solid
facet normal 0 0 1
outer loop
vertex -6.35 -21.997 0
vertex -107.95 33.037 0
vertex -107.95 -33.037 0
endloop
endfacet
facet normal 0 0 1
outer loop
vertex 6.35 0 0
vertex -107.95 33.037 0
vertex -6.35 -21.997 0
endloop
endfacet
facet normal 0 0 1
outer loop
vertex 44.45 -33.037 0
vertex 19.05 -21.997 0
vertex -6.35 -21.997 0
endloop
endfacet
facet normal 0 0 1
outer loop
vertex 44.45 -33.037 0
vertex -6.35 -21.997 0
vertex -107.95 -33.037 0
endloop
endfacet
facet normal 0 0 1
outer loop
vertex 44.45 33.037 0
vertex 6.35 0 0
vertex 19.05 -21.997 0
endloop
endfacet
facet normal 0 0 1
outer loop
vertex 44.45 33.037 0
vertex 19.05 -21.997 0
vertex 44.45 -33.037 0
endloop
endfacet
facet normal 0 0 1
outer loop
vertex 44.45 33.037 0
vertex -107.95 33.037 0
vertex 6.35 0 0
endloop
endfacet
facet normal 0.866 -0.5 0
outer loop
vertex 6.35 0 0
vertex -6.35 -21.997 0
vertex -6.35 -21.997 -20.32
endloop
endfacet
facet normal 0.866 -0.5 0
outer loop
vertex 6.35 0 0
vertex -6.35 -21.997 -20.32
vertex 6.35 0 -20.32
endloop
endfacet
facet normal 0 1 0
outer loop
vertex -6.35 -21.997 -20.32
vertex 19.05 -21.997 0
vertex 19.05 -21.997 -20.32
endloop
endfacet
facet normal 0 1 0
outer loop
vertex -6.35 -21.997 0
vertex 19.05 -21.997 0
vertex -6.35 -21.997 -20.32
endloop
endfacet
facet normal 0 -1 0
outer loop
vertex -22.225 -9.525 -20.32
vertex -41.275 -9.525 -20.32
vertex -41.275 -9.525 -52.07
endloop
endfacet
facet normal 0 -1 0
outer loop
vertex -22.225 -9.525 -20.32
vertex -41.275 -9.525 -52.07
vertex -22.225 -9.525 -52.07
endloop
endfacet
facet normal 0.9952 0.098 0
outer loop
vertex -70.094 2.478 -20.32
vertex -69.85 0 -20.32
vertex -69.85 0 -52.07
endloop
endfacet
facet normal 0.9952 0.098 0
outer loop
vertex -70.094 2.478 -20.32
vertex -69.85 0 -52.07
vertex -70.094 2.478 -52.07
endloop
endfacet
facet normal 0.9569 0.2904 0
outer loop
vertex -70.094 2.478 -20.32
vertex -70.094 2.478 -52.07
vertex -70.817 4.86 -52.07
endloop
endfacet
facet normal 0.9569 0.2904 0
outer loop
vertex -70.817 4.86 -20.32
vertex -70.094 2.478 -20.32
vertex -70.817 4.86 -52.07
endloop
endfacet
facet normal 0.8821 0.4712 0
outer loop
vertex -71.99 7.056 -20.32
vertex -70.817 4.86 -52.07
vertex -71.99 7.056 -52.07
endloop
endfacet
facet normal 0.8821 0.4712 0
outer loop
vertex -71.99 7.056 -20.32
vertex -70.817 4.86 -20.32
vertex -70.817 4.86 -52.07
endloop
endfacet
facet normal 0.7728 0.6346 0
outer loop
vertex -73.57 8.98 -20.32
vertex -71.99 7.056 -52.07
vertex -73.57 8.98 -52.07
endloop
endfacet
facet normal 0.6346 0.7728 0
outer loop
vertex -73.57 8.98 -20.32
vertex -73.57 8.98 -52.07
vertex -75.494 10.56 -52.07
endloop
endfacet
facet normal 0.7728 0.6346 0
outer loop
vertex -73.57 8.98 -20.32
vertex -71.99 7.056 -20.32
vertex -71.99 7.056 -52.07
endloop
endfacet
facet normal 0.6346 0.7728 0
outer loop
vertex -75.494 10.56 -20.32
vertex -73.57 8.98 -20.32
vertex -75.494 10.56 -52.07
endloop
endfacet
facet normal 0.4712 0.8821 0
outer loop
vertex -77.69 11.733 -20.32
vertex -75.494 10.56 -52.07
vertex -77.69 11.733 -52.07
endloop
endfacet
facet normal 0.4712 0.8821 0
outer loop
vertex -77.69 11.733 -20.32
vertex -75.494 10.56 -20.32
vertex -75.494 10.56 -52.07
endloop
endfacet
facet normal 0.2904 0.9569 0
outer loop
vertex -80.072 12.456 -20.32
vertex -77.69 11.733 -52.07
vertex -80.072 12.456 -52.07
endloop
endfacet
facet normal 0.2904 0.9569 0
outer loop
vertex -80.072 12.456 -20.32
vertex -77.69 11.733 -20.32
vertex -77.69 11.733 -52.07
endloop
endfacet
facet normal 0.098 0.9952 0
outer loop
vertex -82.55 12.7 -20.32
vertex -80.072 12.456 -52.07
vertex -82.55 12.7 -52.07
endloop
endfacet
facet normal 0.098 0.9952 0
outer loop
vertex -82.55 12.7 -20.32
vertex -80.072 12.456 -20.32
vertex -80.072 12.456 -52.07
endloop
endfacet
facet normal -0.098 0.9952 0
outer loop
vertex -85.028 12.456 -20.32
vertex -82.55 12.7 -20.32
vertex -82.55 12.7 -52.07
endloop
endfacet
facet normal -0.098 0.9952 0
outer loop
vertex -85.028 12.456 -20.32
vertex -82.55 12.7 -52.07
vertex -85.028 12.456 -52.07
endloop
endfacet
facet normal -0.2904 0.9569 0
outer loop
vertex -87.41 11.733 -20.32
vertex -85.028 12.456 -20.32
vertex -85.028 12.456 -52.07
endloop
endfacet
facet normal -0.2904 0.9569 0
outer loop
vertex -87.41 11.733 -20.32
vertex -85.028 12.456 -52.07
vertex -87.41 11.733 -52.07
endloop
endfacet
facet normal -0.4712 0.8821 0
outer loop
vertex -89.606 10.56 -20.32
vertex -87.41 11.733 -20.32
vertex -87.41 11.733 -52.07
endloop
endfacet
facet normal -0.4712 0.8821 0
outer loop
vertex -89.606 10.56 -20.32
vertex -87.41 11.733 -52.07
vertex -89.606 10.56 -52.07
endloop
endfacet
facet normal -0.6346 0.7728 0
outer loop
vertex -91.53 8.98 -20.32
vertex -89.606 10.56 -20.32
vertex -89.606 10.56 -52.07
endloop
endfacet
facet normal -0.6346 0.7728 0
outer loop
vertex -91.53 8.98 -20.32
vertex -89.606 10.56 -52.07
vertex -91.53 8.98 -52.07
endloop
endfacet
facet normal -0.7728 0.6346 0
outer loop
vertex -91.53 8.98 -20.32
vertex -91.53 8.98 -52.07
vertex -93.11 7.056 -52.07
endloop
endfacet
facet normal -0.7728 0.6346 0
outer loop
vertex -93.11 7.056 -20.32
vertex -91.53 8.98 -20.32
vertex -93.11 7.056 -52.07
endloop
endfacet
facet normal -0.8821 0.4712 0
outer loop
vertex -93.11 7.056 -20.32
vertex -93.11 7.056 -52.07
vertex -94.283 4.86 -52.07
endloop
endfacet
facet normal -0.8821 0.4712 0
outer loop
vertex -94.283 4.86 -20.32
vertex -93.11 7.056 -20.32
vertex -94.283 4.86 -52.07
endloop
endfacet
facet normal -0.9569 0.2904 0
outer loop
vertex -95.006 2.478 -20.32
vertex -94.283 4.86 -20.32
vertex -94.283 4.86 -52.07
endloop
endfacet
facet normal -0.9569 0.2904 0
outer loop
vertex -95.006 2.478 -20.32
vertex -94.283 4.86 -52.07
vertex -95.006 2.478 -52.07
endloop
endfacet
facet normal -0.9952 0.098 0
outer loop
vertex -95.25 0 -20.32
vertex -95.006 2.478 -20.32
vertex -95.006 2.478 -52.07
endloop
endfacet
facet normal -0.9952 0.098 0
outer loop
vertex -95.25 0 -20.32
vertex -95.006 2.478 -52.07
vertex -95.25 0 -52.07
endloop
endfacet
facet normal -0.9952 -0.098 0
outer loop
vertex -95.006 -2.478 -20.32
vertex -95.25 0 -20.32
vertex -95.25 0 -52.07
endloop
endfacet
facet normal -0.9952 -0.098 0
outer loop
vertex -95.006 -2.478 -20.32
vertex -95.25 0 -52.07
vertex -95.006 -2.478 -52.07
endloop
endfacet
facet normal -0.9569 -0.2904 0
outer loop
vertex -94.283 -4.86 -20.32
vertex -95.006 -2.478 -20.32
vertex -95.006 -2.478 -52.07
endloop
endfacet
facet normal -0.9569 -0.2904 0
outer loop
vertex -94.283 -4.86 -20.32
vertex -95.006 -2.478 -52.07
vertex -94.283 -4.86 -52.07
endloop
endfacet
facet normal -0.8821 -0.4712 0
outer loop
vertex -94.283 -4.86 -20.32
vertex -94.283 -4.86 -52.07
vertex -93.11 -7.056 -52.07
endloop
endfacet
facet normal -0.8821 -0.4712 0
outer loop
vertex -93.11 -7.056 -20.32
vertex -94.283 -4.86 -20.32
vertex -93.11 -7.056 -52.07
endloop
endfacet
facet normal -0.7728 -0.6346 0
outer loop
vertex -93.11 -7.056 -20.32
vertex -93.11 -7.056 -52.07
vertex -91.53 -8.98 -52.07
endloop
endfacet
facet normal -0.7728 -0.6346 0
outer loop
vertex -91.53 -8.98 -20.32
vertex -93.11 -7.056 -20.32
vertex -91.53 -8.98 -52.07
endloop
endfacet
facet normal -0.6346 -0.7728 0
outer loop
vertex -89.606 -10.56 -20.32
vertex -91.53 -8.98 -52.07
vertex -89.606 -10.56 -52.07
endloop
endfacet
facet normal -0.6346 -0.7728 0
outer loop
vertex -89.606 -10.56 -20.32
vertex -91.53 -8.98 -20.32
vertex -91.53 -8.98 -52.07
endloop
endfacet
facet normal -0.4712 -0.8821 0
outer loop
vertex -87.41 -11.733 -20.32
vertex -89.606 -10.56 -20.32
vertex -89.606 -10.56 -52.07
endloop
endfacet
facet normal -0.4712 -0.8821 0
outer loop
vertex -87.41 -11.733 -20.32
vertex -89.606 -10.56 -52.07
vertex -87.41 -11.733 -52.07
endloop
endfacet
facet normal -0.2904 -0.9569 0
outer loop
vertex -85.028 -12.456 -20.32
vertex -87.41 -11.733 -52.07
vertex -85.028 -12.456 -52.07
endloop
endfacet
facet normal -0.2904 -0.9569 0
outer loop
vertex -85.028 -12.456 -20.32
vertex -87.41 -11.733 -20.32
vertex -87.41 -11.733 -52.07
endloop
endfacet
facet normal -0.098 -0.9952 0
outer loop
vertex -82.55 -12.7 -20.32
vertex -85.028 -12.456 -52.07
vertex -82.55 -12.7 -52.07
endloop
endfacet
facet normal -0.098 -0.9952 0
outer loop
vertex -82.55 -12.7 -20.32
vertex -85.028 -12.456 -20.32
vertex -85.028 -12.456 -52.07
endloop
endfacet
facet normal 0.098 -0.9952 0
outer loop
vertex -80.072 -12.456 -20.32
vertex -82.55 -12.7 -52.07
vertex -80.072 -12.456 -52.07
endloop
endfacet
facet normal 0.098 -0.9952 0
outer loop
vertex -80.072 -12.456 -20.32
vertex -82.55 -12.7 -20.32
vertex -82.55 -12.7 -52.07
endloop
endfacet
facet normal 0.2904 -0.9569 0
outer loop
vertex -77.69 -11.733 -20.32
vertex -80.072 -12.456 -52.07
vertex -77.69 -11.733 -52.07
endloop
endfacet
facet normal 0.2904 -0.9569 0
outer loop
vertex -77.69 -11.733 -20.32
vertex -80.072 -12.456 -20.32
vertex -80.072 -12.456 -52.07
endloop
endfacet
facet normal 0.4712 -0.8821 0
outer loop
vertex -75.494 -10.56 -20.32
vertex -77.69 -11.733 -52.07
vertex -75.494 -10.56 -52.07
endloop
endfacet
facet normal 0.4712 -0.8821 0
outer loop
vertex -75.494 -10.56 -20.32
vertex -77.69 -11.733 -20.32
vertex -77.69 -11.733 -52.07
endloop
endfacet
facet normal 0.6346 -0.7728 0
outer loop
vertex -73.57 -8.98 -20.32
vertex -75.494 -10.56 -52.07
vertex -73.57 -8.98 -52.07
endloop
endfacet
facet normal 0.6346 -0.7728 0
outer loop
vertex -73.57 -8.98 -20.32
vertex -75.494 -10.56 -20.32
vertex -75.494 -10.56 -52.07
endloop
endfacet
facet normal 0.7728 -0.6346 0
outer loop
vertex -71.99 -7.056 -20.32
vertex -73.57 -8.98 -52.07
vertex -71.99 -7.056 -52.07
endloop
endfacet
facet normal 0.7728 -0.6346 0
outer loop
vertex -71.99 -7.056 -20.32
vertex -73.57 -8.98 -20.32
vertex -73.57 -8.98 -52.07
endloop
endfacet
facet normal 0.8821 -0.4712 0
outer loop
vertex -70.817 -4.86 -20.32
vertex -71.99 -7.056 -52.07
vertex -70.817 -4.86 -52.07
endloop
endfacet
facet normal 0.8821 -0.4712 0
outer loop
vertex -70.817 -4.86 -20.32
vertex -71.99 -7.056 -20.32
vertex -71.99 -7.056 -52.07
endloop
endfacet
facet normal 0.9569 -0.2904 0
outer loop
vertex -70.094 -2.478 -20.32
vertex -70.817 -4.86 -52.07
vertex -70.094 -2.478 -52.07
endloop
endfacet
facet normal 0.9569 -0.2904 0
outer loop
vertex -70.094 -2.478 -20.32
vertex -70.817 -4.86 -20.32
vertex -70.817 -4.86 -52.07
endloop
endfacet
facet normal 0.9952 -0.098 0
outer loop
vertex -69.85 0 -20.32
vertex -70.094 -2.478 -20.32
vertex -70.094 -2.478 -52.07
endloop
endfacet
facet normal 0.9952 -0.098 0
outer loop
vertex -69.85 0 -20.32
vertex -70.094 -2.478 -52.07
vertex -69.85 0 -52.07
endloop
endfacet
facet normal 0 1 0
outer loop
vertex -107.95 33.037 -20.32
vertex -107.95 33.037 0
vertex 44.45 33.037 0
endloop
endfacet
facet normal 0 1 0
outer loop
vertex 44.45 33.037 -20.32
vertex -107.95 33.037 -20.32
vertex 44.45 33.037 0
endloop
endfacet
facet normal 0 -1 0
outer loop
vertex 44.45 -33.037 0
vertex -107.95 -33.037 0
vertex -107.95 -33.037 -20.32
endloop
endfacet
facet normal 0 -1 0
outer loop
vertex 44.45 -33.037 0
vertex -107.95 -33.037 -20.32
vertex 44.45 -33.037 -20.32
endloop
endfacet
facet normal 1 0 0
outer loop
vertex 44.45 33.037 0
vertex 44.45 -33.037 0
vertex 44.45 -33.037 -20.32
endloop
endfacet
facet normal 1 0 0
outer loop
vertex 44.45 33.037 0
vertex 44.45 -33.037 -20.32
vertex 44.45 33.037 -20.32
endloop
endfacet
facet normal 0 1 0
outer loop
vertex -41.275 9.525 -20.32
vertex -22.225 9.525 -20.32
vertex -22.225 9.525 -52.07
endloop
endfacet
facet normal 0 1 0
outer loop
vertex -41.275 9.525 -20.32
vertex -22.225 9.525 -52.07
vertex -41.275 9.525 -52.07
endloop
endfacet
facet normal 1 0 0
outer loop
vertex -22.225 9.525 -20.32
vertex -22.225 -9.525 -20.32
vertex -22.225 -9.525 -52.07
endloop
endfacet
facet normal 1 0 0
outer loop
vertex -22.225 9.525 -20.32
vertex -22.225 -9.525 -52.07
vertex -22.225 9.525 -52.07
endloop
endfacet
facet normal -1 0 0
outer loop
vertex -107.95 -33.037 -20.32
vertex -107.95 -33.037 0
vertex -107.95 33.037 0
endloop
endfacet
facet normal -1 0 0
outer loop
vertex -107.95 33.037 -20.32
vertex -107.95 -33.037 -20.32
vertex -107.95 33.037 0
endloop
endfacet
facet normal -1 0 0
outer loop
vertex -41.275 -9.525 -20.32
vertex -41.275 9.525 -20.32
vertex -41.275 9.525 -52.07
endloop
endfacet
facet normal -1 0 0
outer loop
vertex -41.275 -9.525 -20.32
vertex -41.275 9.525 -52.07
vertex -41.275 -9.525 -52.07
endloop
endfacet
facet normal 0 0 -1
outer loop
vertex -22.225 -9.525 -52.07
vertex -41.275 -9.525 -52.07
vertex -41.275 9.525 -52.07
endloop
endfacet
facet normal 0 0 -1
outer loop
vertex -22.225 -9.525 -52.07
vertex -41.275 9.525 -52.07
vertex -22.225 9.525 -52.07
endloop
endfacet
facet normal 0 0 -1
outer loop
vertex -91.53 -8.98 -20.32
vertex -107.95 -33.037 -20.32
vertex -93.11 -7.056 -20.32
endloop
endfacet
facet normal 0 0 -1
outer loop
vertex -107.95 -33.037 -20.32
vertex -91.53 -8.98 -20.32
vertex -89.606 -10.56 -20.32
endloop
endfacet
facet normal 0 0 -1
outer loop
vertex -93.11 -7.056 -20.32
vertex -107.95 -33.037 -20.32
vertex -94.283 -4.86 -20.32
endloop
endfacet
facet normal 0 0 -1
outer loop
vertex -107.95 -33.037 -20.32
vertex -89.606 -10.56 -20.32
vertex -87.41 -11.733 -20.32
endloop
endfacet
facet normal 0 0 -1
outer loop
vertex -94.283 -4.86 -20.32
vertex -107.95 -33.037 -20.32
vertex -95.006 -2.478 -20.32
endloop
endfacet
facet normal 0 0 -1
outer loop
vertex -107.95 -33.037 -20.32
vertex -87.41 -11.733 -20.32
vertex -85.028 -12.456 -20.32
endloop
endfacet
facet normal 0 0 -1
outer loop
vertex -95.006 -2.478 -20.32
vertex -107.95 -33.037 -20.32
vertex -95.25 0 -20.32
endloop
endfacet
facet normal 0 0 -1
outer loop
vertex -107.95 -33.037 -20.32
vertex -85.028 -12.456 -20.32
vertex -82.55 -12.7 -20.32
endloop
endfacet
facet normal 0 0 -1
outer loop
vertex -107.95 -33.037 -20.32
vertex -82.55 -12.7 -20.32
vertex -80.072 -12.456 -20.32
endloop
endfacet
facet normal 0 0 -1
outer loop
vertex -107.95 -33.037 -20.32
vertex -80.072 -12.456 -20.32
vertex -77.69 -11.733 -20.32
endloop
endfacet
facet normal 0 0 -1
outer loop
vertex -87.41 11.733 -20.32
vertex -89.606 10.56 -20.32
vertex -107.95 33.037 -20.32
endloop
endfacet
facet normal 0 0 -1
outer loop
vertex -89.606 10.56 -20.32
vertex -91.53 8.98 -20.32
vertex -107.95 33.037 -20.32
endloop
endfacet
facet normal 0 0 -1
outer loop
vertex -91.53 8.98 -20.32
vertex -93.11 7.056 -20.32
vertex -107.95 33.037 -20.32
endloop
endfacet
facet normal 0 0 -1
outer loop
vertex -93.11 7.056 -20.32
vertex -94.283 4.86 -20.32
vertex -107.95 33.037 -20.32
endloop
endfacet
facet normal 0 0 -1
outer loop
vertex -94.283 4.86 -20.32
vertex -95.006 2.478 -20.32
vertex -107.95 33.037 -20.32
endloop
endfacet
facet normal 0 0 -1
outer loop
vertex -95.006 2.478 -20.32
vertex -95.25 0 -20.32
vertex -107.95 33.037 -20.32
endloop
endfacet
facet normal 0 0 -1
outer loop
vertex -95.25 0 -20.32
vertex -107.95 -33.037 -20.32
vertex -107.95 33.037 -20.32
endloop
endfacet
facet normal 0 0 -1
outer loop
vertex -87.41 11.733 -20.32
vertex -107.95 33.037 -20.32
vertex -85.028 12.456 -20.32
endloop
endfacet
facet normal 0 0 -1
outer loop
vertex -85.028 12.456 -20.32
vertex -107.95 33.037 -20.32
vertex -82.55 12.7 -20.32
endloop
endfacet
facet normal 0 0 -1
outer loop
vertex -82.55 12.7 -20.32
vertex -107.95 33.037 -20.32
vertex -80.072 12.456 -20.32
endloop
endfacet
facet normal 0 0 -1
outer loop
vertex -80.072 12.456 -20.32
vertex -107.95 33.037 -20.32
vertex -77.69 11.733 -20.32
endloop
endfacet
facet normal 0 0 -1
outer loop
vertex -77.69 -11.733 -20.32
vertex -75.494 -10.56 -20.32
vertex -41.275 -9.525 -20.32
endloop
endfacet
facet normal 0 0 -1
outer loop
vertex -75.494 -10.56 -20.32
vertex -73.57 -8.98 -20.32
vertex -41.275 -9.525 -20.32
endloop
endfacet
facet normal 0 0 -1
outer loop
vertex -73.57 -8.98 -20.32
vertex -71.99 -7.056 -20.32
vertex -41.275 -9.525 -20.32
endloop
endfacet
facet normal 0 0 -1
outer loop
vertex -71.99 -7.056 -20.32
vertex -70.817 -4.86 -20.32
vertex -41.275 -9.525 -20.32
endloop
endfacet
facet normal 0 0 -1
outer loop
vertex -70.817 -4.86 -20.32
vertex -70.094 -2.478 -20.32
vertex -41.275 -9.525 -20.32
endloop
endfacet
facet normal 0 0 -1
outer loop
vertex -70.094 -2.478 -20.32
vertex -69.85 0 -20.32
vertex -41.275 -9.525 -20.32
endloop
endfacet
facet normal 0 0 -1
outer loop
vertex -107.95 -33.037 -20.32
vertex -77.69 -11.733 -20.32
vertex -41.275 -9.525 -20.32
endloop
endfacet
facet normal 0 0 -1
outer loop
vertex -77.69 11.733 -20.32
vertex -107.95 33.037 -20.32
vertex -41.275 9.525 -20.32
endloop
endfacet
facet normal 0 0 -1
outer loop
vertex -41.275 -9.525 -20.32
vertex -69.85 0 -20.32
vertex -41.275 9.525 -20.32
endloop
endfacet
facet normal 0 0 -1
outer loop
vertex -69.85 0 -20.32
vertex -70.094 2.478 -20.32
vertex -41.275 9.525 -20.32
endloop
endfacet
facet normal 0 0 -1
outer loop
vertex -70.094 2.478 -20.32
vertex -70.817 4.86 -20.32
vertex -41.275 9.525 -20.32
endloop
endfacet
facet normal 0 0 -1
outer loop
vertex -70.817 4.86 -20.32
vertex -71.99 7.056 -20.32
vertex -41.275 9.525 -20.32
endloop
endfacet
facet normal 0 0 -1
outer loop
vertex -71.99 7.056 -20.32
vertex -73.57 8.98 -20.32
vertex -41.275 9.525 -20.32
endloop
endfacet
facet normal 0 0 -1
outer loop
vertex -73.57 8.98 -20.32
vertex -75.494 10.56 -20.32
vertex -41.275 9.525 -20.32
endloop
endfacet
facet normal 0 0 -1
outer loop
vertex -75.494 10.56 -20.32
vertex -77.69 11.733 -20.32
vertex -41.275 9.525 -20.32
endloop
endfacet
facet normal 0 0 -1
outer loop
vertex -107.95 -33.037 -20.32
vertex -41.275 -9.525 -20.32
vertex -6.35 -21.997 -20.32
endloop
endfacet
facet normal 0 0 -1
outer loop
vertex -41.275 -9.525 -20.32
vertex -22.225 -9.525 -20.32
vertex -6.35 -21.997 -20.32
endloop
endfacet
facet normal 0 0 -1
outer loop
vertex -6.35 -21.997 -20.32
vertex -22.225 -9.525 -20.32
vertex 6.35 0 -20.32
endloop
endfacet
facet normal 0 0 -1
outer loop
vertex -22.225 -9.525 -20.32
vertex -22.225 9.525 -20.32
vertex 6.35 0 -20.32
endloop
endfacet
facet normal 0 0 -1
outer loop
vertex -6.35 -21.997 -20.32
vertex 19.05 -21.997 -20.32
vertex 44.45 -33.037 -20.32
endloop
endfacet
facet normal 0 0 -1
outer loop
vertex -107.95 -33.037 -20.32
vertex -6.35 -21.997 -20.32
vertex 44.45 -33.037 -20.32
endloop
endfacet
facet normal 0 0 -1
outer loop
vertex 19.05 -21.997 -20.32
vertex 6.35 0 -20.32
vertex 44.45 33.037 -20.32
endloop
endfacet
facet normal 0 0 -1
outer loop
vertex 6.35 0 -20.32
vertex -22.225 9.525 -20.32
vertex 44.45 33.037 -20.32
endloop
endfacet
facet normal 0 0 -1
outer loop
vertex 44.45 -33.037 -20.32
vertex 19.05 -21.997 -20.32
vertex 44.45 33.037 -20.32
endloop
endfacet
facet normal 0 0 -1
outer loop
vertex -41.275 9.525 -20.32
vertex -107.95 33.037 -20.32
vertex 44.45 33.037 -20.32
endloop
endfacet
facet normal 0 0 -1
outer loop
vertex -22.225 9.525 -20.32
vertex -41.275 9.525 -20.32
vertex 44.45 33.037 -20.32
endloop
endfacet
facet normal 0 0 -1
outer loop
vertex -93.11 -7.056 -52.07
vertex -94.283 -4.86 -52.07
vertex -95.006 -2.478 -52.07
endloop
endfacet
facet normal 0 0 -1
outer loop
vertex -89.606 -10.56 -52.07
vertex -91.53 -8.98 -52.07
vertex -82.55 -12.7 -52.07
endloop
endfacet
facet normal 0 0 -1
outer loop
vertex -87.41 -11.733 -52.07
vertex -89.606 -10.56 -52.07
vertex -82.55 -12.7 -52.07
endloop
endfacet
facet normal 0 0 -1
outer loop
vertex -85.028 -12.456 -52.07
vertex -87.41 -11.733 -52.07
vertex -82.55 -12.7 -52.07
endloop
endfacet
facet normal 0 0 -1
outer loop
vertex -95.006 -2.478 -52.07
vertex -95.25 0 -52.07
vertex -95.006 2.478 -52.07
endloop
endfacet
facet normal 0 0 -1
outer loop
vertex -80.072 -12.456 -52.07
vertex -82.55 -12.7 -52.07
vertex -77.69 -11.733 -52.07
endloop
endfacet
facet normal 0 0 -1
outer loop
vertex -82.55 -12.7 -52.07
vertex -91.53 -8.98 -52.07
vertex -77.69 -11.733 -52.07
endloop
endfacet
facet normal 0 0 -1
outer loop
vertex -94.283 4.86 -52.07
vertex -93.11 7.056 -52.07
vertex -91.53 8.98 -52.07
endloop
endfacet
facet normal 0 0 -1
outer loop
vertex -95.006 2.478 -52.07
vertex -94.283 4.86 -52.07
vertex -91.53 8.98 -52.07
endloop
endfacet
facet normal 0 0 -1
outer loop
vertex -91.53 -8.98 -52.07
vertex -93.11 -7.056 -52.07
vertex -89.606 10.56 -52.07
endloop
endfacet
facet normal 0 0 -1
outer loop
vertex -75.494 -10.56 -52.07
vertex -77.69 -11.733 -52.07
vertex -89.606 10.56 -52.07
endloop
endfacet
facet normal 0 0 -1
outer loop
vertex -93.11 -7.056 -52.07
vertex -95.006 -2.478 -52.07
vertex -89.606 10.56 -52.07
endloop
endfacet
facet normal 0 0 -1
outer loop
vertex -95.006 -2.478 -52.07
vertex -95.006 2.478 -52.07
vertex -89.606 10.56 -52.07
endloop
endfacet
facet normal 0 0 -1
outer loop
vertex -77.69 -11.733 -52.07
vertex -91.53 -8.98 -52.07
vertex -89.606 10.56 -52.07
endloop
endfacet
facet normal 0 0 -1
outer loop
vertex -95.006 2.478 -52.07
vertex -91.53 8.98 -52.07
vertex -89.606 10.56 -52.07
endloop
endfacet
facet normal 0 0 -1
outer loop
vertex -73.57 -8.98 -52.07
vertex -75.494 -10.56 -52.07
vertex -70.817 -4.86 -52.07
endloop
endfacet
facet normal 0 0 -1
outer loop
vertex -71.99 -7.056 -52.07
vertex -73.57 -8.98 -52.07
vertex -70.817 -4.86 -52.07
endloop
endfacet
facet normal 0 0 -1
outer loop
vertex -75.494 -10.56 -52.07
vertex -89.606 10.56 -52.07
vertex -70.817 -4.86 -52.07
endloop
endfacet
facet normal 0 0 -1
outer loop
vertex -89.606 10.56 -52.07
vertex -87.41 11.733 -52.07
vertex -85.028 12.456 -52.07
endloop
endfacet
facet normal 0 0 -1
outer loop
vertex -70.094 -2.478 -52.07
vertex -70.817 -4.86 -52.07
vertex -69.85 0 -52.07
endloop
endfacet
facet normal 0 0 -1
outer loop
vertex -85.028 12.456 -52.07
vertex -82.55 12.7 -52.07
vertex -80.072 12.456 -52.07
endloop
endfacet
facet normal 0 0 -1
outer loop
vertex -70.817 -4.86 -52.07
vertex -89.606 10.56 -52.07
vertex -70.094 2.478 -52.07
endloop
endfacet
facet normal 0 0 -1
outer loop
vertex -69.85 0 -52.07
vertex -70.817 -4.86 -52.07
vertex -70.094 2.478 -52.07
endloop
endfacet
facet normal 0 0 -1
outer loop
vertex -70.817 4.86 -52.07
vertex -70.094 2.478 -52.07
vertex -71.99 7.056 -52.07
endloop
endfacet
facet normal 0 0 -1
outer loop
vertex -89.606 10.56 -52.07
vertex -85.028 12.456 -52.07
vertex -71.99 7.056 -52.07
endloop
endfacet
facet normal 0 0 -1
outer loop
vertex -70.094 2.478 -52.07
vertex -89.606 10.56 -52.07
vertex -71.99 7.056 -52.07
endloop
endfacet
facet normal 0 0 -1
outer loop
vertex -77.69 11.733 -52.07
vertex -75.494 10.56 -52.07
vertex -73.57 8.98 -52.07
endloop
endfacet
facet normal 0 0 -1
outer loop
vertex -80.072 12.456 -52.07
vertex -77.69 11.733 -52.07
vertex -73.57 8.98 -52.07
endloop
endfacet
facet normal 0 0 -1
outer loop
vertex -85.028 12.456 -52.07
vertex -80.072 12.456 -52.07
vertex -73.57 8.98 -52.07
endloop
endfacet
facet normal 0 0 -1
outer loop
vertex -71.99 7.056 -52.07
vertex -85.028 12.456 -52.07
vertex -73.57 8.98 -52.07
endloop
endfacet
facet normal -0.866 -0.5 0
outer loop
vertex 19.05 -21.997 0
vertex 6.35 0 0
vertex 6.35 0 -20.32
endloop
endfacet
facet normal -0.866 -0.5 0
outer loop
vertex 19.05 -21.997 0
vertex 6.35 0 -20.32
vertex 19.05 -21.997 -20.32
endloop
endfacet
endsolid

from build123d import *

# Parameters (mm, degrees)
F0_W     = 152.4
F0_H     = 66.074036
F0_R     = 12.7
F1_DEPTH = 20.32
F2_DEPTH = 52.07


with BuildPart() as f1:
    # F0 (on Top) → F1 (new body)
    with BuildSketch(Plane.XY):
        with Locations((-31.75, 0)):
            Rectangle(F0_W, F0_H)
        Polygon((-6.35, -21.997045), (6.35, 0), (19.05, -21.997045), align=None, mode=Mode.SUBTRACT)
        with Locations((-82.55, 0)):
            Circle(F0_R, mode=Mode.SUBTRACT)
        Polygon((-22.225, 9.525), (-22.225, 0), (-22.225, -9.525), (-41.275, -9.525), (-41.275, 0), (-41.275, 9.525), align=None, mode=Mode.SUBTRACT)
    extrude(amount=-F1_DEPTH)

    # F0 (on Top) → F2 (join)
    with BuildSketch(Plane.XY):
        Polygon((-22.225, -9.525), (-22.225, 0), (-31.75, 0), (-41.275, 0), (-41.275, -9.525), align=None)
        Polygon((-31.75, 0), (-22.225, 0), (-22.225, 9.525), (-41.275, 9.525), (-41.275, 0), align=None)
        with Locations((-82.55, 0)):
            Circle(F0_R)
    extrude(amount=-F2_DEPTH)


solid = f1.part
